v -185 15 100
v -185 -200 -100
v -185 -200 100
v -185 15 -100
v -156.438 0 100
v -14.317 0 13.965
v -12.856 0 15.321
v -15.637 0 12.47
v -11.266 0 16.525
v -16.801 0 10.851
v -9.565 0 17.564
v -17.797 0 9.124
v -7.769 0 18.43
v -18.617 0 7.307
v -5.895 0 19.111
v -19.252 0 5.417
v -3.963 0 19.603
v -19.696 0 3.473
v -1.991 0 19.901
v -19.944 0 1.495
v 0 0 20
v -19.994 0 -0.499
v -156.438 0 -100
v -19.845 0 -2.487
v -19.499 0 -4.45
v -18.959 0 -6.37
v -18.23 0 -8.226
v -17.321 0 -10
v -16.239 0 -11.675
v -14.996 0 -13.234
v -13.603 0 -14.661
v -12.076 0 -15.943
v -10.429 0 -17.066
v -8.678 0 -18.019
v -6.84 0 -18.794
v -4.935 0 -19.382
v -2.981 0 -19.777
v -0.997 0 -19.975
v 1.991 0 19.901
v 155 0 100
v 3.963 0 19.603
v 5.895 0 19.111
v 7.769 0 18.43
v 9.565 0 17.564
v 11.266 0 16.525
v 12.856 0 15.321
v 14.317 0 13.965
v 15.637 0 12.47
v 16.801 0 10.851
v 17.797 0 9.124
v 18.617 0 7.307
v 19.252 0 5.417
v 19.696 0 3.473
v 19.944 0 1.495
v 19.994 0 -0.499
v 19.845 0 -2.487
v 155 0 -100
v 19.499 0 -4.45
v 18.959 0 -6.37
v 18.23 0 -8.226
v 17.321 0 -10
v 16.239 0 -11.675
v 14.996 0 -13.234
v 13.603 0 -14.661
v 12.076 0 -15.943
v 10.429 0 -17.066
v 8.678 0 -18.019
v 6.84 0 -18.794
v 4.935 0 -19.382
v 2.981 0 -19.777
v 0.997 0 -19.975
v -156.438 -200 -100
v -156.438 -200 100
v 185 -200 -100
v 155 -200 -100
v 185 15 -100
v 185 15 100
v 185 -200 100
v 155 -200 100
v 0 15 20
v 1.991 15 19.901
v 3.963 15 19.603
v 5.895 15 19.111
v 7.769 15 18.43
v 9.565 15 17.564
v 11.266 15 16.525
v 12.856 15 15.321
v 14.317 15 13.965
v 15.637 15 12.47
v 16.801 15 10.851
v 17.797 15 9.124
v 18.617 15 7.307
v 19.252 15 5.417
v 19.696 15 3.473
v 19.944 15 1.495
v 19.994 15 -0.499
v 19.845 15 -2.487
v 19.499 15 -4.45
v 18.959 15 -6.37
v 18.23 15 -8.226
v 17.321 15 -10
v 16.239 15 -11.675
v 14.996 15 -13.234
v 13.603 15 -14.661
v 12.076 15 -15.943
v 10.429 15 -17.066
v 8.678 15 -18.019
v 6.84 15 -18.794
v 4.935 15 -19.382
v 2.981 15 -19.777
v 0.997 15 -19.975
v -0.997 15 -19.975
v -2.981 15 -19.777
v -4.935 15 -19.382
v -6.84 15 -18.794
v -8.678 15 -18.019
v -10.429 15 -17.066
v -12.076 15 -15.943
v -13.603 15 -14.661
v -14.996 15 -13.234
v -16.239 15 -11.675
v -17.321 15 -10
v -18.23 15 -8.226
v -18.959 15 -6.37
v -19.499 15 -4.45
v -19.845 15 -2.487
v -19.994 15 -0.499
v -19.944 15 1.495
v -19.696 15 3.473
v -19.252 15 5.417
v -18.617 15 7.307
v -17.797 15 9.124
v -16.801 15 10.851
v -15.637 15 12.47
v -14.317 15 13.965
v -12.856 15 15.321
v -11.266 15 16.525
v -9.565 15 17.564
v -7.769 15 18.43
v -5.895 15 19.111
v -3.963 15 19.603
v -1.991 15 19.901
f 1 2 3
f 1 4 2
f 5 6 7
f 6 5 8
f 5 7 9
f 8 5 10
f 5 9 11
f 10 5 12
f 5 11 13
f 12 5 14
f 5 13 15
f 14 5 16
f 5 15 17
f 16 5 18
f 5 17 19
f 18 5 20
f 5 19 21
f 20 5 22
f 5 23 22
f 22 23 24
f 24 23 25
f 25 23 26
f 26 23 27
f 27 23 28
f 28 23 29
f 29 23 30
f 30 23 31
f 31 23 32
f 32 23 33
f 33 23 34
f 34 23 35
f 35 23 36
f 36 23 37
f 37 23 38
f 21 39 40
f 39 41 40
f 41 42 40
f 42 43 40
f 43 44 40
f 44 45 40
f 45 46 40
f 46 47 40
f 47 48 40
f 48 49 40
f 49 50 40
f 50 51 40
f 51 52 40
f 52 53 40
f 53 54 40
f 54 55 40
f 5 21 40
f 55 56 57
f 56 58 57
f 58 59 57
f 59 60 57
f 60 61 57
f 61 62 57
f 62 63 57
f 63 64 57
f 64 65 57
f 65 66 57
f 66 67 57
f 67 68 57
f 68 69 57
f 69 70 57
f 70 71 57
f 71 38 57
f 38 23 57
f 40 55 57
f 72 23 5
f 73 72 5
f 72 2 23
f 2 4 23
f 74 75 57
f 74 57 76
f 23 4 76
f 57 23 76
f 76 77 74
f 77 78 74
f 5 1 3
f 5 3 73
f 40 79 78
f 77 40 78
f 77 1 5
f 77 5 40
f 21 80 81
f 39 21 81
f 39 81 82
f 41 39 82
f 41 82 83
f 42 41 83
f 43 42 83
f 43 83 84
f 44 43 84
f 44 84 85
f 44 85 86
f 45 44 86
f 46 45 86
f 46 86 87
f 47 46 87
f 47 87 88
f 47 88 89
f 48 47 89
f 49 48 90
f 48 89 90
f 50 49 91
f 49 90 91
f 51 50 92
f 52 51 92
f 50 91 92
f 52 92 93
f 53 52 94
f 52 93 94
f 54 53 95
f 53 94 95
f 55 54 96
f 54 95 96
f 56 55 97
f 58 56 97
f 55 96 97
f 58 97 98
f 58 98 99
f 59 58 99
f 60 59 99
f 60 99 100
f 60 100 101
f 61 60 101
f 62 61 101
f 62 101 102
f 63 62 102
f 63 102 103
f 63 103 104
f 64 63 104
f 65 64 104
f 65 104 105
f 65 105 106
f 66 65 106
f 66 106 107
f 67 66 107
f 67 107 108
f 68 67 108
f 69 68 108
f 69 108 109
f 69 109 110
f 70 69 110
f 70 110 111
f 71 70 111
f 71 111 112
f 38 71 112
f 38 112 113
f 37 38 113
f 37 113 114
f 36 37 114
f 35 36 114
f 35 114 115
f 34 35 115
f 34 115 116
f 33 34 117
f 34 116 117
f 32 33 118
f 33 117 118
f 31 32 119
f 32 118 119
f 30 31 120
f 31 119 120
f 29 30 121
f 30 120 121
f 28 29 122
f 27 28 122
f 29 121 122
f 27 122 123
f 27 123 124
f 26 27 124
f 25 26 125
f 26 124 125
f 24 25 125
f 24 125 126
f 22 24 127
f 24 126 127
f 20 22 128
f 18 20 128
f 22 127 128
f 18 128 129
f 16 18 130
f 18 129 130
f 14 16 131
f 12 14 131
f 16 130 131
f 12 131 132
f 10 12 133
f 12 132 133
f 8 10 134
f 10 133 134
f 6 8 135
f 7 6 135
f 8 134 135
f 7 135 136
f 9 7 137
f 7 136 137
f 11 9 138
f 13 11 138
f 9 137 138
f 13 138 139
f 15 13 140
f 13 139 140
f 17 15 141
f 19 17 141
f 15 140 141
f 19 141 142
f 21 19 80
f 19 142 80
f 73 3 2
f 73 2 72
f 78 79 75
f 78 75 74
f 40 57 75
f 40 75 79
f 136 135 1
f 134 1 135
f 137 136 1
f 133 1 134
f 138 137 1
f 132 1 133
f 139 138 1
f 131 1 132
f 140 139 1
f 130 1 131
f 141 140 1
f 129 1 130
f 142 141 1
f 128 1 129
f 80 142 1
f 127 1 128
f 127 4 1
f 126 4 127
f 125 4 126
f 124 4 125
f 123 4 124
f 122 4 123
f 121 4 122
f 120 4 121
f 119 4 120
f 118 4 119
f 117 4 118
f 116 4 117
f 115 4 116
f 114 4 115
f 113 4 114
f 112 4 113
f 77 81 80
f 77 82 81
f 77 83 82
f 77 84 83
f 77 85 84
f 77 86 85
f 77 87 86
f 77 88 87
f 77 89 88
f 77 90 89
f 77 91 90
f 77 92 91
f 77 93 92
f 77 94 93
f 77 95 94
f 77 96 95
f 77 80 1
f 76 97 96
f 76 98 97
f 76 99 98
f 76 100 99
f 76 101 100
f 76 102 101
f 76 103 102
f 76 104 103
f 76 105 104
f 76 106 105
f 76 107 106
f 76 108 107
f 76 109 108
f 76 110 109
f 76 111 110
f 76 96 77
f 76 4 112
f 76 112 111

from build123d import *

# Parameters (mm, degrees)
SKETCH1_W           = 370
SKETCH1_H           = 200
BOSS_EXTRUDE1_DEPTH = 15
SKETCH2_W           = 28.561692334
SKETCH2_H           = 200
SKETCH2_W_2         = 30
BOSS_EXTRUDE2_DEPTH = 200
SKETCH3_R           = 20
CUT_EXTRUDE1_DEPTH  = 200


with BuildPart() as part:
    # Sketch1 → Boss-Extrude1 (new body)
    with BuildSketch(Plane(origin=(0, 0, 0), x_dir=(1, 0, 0), z_dir=(0, 1, 0))):
        Rectangle(SKETCH1_W, SKETCH1_H)
    extrude(amount=BOSS_EXTRUDE1_DEPTH)

    # Sketch2 → Boss-Extrude2 (add)
    with BuildSketch(Plane.XZ):
        with Locations((-170.719153833, 0)):
            Rectangle(SKETCH2_W, SKETCH2_H)
        with Locations((170, 0)):
            Rectangle(SKETCH2_W_2, SKETCH2_H)
    extrude(amount=BOSS_EXTRUDE2_DEPTH)

    # Sketch3 → Cut-Extrude1 (cut)
    with BuildSketch(Plane(origin=(0, 15, 0), x_dir=(1, 0, 0), z_dir=(0, 1, 0))):
        with Locations(Location((0, 0, 0), (0, 0, 270))):
            Circle(SKETCH3_R)
    extrude(amount=-CUT_EXTRUDE1_DEPTH, mode=Mode.SUBTRACT)


solid = part.part
